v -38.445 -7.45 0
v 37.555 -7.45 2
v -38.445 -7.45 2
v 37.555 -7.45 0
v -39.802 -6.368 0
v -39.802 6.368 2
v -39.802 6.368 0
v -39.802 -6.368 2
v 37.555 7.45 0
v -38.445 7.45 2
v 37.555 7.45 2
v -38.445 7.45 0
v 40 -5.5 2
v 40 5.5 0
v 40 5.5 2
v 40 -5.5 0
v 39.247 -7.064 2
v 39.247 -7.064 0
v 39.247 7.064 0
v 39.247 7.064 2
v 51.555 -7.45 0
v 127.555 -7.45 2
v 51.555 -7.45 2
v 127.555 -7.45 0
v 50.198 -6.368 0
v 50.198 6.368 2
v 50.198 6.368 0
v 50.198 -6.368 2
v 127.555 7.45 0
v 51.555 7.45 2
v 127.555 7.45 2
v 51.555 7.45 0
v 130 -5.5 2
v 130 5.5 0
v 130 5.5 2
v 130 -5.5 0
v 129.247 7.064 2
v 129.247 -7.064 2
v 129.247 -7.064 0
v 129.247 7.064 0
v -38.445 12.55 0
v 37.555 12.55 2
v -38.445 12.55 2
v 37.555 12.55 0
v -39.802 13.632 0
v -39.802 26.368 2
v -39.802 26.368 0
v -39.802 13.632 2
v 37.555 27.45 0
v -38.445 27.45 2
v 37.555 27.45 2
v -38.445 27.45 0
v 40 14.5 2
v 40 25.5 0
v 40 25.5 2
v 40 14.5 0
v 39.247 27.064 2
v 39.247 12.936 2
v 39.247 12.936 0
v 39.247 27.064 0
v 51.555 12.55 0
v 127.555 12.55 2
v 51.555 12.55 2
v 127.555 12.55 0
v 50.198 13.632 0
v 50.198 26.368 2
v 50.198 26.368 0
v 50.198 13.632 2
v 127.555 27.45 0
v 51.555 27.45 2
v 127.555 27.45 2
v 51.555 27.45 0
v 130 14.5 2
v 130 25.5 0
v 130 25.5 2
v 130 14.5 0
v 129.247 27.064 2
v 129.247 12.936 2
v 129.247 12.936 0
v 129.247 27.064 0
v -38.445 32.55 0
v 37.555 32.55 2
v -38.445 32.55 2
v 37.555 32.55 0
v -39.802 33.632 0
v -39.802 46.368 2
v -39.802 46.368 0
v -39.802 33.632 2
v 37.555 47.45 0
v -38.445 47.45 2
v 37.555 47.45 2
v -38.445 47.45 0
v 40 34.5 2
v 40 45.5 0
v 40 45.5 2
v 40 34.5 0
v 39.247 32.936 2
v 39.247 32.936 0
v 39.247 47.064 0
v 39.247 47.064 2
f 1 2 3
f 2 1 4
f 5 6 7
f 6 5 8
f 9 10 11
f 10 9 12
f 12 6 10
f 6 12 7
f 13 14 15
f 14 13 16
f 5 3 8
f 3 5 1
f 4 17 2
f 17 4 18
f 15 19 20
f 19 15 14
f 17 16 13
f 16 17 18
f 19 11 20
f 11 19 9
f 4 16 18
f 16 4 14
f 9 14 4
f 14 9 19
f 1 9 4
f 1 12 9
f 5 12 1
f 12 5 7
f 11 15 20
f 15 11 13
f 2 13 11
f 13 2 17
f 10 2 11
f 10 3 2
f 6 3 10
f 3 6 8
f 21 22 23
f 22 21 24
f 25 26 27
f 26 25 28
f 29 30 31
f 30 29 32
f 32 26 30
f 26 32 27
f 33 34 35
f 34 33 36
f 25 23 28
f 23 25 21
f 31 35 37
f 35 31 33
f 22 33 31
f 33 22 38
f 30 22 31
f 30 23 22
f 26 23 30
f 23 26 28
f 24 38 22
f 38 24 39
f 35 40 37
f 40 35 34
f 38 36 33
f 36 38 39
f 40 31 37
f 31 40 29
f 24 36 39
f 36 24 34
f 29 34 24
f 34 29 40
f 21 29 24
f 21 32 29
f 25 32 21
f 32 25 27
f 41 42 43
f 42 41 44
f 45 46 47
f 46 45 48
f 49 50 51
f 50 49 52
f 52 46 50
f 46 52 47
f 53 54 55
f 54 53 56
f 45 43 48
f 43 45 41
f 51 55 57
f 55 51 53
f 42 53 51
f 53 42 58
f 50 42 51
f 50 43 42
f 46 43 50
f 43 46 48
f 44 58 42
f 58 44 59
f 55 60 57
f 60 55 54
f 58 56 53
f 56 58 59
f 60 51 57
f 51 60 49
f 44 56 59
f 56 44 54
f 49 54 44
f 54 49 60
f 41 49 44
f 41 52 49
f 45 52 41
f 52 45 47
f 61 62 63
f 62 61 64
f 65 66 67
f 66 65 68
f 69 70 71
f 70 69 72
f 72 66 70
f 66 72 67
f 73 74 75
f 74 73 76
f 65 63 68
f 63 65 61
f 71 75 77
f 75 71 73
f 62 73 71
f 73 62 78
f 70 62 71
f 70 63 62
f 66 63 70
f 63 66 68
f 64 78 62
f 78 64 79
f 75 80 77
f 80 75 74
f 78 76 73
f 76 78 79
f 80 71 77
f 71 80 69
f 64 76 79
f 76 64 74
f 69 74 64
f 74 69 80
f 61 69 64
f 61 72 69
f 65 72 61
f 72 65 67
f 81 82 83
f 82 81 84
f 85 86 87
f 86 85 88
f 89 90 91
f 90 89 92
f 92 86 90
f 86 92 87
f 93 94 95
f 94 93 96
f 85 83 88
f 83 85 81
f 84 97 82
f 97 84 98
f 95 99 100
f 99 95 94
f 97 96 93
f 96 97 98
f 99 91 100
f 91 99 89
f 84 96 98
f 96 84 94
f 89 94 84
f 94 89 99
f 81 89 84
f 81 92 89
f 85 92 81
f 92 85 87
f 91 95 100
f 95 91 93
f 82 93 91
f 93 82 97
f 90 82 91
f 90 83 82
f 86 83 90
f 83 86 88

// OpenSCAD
// Liste der Namen
namen = ["Max","Muster","Martha","Mathilde","Matthias"];

// Funktion zur Erstellung eines Namensschilds
module namensschild(name) {
        // Rechteckiges Schild mit abgerundeten Ecken
       linear_extrude(height=2)
          rounded_rectangle([80, 15], 2);
      
       translate([0, 0, 1])
            linear_extrude(height = 1)
                text(name, size = 13, halign = "center", valign = "center");
}


// Funktion zur Erstellung eines Rechtecks mit abgerundeten Ecken
module rounded_rectangle(size, radius) {
    minkowski() {
        square(size - [radius * 2, radius * 2], center = true);
        circle(radius);
    }
}

// Namensschilder für alle Namen in der Liste erstellen
for (i = [0:len(namen)-1]) {
    // Berechnung der Position für zwei Spalten
    x = (i % 2) * 90; // 80 mm Breite + 10 mm Abstand
    y = floor(i / 2) * 20; // 15 mm Höhe + 5 mm Abstand
    translate([x, y, 0])
        namensschild(namen[i]);
}
